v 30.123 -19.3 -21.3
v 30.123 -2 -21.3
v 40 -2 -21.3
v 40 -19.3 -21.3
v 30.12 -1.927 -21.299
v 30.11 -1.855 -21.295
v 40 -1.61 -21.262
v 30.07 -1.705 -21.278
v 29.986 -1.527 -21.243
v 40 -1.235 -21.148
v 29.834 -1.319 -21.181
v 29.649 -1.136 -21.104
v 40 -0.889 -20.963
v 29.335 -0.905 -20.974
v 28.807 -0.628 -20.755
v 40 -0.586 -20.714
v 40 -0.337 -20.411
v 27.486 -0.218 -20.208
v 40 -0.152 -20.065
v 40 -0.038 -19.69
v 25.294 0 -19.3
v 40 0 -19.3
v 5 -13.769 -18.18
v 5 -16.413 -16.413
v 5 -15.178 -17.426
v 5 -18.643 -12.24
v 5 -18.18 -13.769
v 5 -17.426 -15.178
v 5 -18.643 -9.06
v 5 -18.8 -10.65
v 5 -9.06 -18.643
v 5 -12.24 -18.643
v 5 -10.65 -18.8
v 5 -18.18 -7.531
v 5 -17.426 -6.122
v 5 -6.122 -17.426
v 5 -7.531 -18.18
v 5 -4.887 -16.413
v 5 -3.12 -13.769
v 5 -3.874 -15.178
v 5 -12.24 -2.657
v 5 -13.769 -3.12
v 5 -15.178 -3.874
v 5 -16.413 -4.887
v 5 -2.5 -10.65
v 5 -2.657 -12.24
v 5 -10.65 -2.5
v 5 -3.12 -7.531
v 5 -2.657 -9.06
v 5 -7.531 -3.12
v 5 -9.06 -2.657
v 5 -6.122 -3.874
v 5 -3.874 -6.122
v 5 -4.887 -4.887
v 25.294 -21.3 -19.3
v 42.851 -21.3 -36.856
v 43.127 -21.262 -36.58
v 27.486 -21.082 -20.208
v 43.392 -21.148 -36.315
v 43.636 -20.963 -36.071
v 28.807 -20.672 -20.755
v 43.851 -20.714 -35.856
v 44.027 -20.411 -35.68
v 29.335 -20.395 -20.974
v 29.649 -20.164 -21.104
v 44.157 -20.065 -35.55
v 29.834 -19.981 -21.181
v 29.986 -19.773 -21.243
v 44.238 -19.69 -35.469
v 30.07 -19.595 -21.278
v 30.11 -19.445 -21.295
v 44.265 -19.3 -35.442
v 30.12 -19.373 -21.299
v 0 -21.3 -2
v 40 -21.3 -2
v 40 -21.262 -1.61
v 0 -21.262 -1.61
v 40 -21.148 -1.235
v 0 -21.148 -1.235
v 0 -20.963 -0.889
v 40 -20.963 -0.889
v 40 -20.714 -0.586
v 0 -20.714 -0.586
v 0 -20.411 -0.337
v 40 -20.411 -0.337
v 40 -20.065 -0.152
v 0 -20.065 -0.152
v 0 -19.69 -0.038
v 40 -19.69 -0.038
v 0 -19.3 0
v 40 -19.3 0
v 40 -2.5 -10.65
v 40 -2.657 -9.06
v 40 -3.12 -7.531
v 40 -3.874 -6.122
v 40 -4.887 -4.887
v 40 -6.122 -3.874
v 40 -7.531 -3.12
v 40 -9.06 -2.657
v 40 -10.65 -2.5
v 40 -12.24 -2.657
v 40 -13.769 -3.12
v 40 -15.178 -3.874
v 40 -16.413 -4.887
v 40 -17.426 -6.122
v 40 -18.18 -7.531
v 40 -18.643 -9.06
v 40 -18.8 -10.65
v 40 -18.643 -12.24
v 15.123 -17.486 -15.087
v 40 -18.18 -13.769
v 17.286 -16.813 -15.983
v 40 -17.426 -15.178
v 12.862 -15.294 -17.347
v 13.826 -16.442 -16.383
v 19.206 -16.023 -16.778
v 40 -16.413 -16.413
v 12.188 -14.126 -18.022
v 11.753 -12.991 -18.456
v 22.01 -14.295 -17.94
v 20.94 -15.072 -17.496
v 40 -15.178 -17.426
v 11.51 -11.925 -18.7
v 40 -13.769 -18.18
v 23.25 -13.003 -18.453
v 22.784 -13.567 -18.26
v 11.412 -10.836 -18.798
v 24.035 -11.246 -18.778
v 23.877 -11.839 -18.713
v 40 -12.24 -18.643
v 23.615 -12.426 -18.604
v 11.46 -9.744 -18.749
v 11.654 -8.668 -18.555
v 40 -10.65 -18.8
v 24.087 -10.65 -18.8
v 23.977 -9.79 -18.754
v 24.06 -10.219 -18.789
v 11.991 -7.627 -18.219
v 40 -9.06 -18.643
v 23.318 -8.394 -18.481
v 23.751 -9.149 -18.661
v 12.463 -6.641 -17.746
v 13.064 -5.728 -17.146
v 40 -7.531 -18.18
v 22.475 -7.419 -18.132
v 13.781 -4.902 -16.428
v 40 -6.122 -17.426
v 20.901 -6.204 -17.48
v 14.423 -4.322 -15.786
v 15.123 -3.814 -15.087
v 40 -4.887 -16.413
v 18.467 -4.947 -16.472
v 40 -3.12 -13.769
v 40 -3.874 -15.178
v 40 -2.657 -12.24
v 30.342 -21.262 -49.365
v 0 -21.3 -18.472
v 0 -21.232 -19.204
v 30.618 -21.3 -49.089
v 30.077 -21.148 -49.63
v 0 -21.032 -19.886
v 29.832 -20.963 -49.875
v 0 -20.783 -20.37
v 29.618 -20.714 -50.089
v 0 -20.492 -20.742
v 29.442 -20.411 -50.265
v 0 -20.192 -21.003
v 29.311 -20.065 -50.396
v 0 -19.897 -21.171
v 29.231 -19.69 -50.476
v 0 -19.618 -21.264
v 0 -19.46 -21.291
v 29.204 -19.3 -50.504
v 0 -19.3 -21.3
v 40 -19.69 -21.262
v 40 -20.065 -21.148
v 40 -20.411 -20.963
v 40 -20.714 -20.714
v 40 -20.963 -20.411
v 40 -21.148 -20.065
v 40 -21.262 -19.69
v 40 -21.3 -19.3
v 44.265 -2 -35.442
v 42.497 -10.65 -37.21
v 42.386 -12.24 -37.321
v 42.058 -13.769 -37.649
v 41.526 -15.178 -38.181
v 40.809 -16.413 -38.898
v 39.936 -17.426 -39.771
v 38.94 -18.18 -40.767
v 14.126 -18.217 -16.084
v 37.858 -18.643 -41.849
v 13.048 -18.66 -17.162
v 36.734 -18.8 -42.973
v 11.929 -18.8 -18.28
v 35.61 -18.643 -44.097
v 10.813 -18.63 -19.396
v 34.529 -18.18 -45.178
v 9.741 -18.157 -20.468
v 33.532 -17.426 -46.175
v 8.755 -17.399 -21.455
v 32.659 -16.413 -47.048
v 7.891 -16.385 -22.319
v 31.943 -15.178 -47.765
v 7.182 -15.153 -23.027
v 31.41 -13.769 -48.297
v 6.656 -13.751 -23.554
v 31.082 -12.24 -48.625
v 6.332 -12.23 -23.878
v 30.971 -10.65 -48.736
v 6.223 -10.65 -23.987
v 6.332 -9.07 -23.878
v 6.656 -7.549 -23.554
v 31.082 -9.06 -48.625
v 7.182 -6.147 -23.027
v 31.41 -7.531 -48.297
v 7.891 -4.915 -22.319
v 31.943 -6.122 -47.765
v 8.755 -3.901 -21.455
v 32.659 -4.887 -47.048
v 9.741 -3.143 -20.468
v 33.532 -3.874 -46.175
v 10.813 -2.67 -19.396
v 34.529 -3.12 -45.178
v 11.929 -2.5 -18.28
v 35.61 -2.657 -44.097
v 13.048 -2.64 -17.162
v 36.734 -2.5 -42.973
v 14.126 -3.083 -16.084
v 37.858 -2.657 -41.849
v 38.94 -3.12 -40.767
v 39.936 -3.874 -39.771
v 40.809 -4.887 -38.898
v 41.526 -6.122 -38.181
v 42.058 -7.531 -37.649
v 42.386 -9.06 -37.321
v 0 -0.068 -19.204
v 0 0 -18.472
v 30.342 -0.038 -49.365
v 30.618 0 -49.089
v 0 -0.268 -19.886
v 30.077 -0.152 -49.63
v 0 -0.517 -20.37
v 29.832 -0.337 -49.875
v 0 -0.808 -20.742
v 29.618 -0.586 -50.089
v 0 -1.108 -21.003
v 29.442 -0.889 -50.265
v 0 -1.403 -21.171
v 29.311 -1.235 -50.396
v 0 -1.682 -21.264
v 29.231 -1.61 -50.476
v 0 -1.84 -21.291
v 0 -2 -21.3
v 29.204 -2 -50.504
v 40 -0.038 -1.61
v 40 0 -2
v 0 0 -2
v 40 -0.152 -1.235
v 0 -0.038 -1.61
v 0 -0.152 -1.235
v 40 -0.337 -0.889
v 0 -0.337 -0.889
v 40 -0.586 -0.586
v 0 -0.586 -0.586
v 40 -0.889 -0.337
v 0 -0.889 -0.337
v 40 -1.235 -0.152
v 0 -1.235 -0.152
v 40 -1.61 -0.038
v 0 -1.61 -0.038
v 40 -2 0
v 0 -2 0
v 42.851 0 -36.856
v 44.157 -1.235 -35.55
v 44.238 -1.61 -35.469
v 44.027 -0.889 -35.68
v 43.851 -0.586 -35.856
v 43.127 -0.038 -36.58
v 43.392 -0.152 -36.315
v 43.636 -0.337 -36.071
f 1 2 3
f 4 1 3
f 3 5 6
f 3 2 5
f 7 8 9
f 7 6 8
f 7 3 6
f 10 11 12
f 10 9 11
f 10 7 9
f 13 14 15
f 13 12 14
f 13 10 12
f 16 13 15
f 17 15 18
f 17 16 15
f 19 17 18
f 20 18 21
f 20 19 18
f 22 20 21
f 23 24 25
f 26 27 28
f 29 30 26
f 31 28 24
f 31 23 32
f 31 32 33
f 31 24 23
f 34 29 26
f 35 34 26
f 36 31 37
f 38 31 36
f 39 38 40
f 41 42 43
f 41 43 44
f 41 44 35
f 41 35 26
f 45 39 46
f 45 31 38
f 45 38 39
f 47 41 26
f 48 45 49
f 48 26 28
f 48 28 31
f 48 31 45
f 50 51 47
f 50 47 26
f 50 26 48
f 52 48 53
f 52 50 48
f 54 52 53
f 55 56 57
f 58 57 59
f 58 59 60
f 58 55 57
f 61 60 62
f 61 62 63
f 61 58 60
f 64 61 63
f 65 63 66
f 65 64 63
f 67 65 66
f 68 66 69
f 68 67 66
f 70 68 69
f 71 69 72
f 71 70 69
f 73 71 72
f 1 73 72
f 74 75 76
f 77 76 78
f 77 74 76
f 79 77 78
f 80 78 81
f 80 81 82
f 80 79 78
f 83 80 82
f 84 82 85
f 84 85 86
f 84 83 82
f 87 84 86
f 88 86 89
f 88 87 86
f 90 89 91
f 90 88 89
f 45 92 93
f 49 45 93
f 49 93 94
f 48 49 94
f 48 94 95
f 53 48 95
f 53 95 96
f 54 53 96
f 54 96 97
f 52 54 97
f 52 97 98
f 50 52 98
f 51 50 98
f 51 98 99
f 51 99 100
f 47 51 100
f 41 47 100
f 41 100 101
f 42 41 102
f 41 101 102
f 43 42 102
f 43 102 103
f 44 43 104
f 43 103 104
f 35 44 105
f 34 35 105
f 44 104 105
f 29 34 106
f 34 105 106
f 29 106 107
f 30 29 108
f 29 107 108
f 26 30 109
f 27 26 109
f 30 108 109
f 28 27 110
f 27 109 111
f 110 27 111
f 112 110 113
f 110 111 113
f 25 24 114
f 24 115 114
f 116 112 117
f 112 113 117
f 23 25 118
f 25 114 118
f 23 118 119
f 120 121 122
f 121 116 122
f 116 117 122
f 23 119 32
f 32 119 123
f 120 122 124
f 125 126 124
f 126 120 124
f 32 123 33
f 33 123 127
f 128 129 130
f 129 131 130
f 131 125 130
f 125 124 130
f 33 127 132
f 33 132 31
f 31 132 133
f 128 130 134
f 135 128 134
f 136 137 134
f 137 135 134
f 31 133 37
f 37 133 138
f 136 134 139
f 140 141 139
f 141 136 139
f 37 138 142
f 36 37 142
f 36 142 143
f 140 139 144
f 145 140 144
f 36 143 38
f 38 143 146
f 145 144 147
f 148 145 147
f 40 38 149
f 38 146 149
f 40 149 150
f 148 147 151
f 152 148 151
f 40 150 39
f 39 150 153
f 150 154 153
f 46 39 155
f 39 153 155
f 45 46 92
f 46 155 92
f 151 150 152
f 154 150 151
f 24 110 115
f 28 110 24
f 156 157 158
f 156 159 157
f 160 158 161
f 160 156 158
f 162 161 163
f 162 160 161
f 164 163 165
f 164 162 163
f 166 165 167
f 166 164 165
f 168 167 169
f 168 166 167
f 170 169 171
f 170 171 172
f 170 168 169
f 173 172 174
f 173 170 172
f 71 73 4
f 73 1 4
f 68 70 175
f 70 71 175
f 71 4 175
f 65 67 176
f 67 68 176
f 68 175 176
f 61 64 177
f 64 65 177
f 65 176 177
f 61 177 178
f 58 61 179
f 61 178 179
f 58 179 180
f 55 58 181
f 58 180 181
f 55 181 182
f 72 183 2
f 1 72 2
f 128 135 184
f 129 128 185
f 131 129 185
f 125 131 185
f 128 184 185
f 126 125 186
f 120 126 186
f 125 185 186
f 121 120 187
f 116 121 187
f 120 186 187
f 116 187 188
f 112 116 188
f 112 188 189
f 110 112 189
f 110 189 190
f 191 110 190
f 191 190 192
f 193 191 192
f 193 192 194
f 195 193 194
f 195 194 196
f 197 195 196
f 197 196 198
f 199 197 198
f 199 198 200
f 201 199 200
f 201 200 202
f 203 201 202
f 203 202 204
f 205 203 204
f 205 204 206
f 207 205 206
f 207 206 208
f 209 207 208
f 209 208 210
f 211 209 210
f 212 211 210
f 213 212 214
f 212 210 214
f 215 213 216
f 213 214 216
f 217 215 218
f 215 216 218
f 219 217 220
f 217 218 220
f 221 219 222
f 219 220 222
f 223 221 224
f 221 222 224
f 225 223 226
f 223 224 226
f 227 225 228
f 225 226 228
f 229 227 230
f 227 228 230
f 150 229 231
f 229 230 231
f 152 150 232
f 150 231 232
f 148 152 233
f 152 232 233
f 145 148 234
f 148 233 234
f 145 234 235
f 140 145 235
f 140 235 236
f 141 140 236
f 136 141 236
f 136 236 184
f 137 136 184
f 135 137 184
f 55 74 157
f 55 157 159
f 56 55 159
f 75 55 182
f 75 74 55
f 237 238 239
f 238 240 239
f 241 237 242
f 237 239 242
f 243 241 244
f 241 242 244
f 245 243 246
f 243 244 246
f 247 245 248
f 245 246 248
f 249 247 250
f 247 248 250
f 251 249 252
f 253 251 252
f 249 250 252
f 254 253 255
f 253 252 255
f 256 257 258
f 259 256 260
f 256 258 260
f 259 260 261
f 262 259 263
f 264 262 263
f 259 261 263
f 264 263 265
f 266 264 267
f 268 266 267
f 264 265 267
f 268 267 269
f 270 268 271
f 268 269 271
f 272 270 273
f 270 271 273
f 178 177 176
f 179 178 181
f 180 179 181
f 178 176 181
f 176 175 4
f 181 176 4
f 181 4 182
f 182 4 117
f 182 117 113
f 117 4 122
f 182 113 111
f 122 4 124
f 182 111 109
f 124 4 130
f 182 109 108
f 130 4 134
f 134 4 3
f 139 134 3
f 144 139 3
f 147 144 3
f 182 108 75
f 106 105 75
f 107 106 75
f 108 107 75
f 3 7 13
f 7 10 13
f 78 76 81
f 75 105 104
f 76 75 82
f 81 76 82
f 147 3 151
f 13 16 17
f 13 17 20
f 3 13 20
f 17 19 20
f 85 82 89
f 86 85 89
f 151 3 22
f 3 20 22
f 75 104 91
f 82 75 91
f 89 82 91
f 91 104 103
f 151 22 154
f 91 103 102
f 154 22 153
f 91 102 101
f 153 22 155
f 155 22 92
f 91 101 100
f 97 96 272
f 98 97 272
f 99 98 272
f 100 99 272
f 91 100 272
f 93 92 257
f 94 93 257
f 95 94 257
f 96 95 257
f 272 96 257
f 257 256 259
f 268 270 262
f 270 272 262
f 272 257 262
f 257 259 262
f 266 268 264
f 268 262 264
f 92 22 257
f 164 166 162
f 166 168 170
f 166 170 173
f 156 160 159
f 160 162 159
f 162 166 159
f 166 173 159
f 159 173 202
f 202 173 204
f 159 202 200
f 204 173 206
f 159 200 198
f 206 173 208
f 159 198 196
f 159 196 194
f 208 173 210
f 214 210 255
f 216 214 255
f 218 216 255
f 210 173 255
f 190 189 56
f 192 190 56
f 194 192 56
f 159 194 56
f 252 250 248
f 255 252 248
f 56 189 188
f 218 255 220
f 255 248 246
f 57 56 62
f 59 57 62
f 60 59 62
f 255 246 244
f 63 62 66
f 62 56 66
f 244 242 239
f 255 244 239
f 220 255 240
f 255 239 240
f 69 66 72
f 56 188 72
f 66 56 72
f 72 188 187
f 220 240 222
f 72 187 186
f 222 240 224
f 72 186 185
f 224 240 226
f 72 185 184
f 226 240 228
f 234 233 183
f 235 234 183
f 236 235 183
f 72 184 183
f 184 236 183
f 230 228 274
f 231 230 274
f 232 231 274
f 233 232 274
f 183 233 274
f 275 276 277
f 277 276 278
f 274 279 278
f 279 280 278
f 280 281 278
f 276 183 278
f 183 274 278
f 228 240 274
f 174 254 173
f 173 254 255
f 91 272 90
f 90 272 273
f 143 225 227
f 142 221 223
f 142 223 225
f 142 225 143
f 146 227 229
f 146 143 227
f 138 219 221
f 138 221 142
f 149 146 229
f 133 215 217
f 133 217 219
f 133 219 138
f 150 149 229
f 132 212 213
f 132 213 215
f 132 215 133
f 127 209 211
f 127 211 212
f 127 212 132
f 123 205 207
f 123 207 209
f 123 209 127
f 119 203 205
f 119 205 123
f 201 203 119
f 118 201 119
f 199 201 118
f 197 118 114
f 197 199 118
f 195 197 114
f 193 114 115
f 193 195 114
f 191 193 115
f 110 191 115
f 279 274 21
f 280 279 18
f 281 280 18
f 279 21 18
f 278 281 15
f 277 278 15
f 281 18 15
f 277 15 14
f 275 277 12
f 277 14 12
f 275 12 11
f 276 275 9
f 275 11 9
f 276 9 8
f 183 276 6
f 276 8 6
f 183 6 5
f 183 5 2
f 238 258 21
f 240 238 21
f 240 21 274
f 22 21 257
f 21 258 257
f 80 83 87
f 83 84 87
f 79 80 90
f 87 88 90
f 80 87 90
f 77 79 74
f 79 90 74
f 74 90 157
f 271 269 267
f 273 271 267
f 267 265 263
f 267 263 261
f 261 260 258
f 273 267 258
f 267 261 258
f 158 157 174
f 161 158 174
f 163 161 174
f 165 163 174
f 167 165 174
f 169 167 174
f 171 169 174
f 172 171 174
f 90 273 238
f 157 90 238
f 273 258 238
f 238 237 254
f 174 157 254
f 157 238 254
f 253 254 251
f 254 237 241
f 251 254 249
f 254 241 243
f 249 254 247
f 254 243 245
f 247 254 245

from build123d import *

# Parameters (mm, degrees)
F1_DEPTH = 21.3
F3_R     = 8.15
F4_DEPTH = 35
F2_R     = 8.15
F5_DEPTH = 35
F6_R     = 2


with BuildPart() as f1:
    # F0 (on Front) → F1 (new body)
    with BuildSketch(Plane.XZ):
        Polygon((40, -21.3), (40, -18.8), (24.0872149726, -18.8), (42.4971175493, -37.2099025767), (44.2648845023, -35.4421356237), (30.1227488785, -21.3), align=None)
        Polygon((40, -18.8), (40, -2.5), (2.5, -2.5), (2.5, -20.2644660941), (30.971277016, -48.73574311), (42.4971175493, -37.2099025767), (24.0872149726, -18.8), align=None)
        Polygon((40, 0), (0, 0), (0, -21.3), (29.203510063, -50.503510063), (30.971277016, -48.73574311), (2.5, -20.2644660941), (2.5, -2.5), (40, -2.5), align=None)
    extrude(amount=F1_DEPTH)

    # F3 (on face) → F4 (cut)
    with BuildSketch(Plane(origin=(39.853510063, 0, -39.853510063), x_dir=(0.7071067812, 0, 0.7071067812), z_dir=(0.7071067812, 0, -0.7071067812))):
        with Locations((-4.4113744393, 10.65)):
            Circle(F3_R)
    extrude(amount=-F4_DEPTH, mode=Mode.SUBTRACT)

    # F2 (on face) → F5 (cut)
    with BuildSketch(Plane.YZ.offset(40)):
        with Locations((-10.65, -10.65)):
            Circle(F2_R)
    extrude(amount=-F5_DEPTH, mode=Mode.SUBTRACT)

    # F6
    f6_edges = [f1.edges().sort_by_distance(p)[0] for p in [
        (20, 0, 0),
        (20, -21.3, 0),
        (14.601755, -21.3, -35.901755),
        (14.601755, 0, -35.901755),
        (37.193817, -21.3, -28.371068),
        (37.193817, 0, -28.371068),
        (35.061374, 0, -21.3),
        (35.061374, -21.3, -21.3),
    ]]
    fillet(f6_edges, radius=F6_R)


solid = f1.part
